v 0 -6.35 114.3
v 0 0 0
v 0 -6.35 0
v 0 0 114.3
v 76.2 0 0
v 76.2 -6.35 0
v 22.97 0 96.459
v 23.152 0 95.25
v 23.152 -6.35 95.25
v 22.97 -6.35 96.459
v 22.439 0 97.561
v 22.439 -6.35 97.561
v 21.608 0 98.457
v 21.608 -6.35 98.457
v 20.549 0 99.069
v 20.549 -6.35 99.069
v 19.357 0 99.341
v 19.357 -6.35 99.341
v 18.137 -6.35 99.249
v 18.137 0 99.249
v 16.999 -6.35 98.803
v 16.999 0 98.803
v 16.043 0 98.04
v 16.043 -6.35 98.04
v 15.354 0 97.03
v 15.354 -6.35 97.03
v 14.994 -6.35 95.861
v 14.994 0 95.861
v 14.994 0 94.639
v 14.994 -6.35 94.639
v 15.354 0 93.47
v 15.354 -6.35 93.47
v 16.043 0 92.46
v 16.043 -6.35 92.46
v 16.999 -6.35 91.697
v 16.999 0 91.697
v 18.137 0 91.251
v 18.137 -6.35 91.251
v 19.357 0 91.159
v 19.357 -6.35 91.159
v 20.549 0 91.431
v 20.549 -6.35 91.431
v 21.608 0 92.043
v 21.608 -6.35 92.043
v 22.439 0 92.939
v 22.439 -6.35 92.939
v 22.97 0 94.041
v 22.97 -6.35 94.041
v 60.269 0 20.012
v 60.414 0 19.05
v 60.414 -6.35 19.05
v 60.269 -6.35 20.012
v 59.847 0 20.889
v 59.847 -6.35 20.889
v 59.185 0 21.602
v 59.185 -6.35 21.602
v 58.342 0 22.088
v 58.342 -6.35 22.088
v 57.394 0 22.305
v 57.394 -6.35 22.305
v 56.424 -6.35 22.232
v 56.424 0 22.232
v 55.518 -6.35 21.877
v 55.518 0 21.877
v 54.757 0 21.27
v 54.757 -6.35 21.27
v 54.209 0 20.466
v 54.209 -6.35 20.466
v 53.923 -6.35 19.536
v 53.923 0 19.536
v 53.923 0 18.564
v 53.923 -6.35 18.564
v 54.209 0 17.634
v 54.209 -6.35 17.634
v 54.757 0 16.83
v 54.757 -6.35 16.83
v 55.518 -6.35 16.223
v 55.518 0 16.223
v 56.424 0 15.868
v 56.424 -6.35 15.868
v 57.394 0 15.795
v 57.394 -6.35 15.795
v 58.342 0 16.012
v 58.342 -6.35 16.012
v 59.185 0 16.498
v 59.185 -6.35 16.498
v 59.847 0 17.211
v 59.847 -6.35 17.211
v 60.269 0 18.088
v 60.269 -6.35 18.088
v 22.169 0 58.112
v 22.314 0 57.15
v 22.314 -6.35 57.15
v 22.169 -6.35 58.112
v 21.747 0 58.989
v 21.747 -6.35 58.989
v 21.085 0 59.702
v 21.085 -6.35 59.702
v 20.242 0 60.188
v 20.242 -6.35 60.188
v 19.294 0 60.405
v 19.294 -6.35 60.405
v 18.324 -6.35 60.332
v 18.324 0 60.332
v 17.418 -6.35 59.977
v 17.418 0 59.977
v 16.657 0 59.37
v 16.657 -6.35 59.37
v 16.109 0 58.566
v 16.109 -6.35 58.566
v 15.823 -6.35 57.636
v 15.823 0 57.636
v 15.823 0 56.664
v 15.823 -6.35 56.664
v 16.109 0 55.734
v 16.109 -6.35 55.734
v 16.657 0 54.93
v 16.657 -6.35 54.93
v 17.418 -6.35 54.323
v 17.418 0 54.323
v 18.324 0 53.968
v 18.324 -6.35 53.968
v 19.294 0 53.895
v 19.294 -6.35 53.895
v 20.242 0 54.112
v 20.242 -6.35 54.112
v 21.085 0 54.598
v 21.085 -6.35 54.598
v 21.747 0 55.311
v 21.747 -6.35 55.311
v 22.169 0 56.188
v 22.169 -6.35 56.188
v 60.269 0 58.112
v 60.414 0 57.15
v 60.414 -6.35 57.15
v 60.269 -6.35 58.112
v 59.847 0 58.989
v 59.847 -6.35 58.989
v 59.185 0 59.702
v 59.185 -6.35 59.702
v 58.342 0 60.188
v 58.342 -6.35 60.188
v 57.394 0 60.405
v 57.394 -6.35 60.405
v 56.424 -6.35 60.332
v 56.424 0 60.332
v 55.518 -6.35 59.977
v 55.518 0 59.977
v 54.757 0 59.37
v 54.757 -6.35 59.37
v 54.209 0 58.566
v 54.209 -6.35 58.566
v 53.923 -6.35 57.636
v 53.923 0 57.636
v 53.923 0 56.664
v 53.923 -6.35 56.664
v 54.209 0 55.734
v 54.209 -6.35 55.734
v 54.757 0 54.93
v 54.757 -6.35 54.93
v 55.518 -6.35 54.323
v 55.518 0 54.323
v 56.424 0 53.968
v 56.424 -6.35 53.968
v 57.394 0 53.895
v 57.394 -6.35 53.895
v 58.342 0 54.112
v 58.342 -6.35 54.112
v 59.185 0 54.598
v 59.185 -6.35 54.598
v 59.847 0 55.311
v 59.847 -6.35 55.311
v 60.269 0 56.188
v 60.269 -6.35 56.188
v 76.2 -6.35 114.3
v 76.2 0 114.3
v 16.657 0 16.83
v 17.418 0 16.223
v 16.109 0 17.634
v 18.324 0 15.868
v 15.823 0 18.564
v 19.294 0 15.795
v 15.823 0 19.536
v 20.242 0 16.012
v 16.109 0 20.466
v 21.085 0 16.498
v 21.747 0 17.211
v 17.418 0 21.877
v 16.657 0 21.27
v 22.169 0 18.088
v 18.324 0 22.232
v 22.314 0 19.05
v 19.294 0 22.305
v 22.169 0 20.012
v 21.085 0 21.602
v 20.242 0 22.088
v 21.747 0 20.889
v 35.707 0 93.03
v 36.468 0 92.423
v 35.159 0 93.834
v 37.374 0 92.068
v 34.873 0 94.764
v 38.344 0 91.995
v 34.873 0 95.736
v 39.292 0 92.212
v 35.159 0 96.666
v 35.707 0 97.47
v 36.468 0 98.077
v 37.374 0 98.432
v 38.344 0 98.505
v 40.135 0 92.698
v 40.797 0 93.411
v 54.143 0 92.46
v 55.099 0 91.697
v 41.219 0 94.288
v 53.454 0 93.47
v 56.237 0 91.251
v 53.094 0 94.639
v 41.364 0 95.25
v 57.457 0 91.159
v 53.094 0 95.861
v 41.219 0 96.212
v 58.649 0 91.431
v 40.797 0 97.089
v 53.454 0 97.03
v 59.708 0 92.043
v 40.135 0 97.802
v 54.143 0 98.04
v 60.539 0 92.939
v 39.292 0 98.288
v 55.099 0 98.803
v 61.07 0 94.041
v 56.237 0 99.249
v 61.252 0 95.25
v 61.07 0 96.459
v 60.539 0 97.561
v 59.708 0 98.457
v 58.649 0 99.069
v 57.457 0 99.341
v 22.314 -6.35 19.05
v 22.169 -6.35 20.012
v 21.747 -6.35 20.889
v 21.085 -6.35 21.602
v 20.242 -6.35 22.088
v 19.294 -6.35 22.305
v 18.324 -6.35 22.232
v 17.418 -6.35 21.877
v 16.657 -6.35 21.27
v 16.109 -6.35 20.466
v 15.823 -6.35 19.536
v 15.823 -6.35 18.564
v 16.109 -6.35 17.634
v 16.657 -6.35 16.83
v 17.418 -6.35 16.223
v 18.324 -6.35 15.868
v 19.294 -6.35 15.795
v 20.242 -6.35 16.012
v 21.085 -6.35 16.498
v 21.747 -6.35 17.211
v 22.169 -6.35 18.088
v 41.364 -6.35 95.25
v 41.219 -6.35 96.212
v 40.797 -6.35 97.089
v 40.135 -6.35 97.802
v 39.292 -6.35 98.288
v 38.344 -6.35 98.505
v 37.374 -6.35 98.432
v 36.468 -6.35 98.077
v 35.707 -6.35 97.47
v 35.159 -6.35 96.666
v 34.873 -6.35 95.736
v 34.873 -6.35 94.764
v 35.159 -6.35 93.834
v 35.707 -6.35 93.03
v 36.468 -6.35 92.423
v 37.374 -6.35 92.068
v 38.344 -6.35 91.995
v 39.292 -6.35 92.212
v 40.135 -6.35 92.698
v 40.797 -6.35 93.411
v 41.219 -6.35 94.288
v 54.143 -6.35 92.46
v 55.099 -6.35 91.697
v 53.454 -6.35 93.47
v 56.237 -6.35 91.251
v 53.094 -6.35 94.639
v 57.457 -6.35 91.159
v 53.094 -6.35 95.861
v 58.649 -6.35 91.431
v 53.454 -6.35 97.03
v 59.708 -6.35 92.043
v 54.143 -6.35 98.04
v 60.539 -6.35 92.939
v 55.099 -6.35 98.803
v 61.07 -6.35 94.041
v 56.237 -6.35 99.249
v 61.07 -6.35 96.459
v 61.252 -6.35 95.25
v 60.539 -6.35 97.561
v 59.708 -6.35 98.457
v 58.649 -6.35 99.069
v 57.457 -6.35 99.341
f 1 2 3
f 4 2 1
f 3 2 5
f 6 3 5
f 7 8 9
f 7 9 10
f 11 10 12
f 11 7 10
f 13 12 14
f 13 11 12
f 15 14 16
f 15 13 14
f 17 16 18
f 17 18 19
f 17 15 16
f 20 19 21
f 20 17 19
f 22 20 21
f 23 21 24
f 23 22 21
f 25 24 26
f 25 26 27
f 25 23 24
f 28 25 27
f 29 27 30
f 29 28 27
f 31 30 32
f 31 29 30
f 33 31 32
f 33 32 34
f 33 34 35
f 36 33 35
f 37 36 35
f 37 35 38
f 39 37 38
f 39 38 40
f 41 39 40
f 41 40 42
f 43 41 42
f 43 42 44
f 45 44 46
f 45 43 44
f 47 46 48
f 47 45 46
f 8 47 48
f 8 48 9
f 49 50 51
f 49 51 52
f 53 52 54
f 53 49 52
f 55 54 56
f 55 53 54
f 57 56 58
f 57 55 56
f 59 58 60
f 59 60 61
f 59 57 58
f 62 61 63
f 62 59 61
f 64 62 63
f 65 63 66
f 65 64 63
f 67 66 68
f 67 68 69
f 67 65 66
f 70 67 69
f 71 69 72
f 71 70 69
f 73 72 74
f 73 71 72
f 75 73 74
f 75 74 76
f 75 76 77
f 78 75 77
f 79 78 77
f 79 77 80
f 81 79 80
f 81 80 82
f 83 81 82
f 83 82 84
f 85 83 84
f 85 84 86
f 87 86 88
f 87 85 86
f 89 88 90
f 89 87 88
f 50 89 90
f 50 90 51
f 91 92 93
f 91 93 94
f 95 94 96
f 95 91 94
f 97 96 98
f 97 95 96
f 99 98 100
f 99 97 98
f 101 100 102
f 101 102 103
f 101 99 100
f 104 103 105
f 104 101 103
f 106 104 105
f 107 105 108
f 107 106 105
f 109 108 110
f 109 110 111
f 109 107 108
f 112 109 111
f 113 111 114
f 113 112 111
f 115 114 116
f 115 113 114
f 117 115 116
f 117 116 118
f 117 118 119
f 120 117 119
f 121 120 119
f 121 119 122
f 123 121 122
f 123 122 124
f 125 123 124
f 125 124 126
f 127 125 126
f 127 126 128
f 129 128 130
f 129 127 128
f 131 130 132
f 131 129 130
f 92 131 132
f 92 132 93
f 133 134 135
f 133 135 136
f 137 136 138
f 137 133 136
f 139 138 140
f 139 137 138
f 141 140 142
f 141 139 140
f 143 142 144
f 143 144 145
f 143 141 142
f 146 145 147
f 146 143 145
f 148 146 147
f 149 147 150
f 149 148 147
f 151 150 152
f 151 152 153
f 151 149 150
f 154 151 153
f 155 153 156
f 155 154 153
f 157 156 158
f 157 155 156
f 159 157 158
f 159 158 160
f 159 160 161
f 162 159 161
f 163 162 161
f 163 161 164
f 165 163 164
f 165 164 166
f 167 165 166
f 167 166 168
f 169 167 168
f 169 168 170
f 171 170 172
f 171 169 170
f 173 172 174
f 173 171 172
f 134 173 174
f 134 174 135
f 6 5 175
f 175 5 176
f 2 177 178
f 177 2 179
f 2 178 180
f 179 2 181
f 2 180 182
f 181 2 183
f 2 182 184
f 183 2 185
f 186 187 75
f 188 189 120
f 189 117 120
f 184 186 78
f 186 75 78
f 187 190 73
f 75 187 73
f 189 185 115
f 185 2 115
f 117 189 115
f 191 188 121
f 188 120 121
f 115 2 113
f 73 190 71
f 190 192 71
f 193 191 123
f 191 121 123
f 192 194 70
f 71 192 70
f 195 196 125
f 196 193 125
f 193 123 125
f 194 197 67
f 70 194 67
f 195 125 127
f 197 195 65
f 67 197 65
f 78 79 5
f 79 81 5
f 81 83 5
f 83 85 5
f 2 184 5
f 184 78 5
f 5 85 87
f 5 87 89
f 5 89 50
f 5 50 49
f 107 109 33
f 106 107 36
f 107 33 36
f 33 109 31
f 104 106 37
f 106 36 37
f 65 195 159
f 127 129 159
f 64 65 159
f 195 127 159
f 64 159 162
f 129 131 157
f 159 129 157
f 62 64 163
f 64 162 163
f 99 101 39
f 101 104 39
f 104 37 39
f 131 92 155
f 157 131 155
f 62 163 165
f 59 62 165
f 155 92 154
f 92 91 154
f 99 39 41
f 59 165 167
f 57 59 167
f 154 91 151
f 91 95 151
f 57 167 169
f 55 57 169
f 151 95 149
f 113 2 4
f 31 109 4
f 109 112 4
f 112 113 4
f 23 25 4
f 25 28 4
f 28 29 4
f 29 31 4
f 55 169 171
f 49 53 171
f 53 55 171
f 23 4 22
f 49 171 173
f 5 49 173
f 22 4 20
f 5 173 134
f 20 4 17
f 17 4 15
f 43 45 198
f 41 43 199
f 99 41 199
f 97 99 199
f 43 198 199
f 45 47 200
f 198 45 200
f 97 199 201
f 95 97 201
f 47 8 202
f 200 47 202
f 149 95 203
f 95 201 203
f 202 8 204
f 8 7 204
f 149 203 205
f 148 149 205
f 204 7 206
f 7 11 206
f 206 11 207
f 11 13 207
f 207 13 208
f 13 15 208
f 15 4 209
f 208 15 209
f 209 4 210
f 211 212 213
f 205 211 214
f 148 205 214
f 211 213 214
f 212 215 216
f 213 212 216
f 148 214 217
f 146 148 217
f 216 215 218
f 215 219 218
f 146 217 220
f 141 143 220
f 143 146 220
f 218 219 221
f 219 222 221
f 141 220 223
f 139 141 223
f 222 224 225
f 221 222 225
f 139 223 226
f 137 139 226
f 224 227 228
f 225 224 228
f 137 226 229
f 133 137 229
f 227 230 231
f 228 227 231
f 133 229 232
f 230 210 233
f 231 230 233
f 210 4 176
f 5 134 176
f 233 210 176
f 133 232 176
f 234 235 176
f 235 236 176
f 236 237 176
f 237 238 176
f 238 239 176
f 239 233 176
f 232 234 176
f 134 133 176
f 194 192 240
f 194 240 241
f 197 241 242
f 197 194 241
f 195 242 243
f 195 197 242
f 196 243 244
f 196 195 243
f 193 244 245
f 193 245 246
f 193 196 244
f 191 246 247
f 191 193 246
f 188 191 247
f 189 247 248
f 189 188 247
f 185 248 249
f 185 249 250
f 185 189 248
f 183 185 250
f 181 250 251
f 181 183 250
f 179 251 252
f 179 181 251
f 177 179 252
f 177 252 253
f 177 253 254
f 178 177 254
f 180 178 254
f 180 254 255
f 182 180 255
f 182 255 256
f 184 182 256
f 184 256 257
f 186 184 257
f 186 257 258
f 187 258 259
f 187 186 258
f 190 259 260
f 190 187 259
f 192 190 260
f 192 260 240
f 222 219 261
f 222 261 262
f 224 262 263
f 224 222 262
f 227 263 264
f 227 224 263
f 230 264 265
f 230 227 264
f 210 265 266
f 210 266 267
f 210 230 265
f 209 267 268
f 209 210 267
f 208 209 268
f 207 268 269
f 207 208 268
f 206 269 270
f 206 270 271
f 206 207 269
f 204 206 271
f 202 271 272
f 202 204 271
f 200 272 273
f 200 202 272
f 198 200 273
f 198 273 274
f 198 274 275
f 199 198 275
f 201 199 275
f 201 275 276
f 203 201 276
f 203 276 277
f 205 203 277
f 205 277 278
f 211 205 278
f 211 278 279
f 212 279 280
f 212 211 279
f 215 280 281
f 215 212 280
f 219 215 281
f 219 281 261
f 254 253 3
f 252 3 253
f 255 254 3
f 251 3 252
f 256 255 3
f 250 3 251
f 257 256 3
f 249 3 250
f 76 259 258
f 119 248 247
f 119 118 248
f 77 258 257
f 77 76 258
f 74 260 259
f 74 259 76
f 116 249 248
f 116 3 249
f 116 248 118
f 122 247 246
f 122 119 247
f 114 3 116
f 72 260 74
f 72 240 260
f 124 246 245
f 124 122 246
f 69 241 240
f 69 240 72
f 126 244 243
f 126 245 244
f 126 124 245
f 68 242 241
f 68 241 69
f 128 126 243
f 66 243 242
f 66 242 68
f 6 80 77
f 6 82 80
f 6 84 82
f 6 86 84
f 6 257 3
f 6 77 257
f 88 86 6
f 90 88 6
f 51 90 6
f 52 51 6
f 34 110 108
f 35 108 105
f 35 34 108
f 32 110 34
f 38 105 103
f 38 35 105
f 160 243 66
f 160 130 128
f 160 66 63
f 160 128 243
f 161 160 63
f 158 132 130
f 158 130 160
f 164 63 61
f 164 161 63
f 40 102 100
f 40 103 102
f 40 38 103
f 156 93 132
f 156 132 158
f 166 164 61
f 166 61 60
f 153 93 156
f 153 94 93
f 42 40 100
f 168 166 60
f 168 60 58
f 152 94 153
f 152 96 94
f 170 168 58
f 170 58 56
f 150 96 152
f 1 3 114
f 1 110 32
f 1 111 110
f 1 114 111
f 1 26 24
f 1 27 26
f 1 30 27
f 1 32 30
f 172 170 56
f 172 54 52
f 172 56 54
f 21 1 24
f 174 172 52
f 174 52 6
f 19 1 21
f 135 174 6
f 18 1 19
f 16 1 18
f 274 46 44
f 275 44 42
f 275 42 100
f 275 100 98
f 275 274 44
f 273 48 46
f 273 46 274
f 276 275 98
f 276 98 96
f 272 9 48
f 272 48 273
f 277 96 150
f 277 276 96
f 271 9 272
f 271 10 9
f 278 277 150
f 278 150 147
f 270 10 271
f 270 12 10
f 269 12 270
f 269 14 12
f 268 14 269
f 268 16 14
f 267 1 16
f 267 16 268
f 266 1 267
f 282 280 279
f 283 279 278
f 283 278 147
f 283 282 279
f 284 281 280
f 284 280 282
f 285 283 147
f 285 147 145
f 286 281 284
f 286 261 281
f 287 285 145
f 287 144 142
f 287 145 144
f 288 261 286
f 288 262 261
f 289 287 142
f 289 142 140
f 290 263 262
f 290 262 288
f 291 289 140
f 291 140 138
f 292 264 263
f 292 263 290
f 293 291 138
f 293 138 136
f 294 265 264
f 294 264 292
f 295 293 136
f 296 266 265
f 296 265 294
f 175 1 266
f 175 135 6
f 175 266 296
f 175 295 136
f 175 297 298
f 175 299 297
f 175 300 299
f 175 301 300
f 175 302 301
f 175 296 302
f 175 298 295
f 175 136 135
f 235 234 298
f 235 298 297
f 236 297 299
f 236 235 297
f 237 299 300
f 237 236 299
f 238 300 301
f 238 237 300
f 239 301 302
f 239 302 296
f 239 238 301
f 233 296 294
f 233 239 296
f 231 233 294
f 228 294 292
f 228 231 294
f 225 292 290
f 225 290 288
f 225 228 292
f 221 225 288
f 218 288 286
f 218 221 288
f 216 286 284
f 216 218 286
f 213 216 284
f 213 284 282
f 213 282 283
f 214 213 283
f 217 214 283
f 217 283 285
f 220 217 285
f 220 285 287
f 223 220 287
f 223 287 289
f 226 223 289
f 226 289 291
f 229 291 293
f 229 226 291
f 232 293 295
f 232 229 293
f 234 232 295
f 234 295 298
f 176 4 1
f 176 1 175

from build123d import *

# Parameters (mm, degrees)
F0_W     = 76.2
F0_H     = 114.3
F0_R     = 3.2639
F0_R_2   = 4.1021
F1_DEPTH = 6.35


with BuildPart() as f1:
    # F0 (on Front) → F1 (new body)
    with BuildSketch(Plane.XZ):
        with Locations((38.1, 57.15)):
            Rectangle(F0_W, F0_H)
        with Locations((19.05, 19.05)):
            Circle(F0_R, mode=Mode.SUBTRACT)
        with Locations((57.15, 19.05)):
            Circle(F0_R, mode=Mode.SUBTRACT)
        with Locations((19.05, 57.15)):
            Circle(F0_R, mode=Mode.SUBTRACT)
        with Locations((19.05, 95.25)):
            Circle(F0_R_2, mode=Mode.SUBTRACT)
        with Locations((57.15, 57.15)):
            Circle(F0_R, mode=Mode.SUBTRACT)
        with Locations((38.1, 95.25)):
            Circle(F0_R, mode=Mode.SUBTRACT)
        with Locations((57.15, 95.25)):
            Circle(F0_R_2, mode=Mode.SUBTRACT)
    extrude(amount=F1_DEPTH)


solid = f1.part
